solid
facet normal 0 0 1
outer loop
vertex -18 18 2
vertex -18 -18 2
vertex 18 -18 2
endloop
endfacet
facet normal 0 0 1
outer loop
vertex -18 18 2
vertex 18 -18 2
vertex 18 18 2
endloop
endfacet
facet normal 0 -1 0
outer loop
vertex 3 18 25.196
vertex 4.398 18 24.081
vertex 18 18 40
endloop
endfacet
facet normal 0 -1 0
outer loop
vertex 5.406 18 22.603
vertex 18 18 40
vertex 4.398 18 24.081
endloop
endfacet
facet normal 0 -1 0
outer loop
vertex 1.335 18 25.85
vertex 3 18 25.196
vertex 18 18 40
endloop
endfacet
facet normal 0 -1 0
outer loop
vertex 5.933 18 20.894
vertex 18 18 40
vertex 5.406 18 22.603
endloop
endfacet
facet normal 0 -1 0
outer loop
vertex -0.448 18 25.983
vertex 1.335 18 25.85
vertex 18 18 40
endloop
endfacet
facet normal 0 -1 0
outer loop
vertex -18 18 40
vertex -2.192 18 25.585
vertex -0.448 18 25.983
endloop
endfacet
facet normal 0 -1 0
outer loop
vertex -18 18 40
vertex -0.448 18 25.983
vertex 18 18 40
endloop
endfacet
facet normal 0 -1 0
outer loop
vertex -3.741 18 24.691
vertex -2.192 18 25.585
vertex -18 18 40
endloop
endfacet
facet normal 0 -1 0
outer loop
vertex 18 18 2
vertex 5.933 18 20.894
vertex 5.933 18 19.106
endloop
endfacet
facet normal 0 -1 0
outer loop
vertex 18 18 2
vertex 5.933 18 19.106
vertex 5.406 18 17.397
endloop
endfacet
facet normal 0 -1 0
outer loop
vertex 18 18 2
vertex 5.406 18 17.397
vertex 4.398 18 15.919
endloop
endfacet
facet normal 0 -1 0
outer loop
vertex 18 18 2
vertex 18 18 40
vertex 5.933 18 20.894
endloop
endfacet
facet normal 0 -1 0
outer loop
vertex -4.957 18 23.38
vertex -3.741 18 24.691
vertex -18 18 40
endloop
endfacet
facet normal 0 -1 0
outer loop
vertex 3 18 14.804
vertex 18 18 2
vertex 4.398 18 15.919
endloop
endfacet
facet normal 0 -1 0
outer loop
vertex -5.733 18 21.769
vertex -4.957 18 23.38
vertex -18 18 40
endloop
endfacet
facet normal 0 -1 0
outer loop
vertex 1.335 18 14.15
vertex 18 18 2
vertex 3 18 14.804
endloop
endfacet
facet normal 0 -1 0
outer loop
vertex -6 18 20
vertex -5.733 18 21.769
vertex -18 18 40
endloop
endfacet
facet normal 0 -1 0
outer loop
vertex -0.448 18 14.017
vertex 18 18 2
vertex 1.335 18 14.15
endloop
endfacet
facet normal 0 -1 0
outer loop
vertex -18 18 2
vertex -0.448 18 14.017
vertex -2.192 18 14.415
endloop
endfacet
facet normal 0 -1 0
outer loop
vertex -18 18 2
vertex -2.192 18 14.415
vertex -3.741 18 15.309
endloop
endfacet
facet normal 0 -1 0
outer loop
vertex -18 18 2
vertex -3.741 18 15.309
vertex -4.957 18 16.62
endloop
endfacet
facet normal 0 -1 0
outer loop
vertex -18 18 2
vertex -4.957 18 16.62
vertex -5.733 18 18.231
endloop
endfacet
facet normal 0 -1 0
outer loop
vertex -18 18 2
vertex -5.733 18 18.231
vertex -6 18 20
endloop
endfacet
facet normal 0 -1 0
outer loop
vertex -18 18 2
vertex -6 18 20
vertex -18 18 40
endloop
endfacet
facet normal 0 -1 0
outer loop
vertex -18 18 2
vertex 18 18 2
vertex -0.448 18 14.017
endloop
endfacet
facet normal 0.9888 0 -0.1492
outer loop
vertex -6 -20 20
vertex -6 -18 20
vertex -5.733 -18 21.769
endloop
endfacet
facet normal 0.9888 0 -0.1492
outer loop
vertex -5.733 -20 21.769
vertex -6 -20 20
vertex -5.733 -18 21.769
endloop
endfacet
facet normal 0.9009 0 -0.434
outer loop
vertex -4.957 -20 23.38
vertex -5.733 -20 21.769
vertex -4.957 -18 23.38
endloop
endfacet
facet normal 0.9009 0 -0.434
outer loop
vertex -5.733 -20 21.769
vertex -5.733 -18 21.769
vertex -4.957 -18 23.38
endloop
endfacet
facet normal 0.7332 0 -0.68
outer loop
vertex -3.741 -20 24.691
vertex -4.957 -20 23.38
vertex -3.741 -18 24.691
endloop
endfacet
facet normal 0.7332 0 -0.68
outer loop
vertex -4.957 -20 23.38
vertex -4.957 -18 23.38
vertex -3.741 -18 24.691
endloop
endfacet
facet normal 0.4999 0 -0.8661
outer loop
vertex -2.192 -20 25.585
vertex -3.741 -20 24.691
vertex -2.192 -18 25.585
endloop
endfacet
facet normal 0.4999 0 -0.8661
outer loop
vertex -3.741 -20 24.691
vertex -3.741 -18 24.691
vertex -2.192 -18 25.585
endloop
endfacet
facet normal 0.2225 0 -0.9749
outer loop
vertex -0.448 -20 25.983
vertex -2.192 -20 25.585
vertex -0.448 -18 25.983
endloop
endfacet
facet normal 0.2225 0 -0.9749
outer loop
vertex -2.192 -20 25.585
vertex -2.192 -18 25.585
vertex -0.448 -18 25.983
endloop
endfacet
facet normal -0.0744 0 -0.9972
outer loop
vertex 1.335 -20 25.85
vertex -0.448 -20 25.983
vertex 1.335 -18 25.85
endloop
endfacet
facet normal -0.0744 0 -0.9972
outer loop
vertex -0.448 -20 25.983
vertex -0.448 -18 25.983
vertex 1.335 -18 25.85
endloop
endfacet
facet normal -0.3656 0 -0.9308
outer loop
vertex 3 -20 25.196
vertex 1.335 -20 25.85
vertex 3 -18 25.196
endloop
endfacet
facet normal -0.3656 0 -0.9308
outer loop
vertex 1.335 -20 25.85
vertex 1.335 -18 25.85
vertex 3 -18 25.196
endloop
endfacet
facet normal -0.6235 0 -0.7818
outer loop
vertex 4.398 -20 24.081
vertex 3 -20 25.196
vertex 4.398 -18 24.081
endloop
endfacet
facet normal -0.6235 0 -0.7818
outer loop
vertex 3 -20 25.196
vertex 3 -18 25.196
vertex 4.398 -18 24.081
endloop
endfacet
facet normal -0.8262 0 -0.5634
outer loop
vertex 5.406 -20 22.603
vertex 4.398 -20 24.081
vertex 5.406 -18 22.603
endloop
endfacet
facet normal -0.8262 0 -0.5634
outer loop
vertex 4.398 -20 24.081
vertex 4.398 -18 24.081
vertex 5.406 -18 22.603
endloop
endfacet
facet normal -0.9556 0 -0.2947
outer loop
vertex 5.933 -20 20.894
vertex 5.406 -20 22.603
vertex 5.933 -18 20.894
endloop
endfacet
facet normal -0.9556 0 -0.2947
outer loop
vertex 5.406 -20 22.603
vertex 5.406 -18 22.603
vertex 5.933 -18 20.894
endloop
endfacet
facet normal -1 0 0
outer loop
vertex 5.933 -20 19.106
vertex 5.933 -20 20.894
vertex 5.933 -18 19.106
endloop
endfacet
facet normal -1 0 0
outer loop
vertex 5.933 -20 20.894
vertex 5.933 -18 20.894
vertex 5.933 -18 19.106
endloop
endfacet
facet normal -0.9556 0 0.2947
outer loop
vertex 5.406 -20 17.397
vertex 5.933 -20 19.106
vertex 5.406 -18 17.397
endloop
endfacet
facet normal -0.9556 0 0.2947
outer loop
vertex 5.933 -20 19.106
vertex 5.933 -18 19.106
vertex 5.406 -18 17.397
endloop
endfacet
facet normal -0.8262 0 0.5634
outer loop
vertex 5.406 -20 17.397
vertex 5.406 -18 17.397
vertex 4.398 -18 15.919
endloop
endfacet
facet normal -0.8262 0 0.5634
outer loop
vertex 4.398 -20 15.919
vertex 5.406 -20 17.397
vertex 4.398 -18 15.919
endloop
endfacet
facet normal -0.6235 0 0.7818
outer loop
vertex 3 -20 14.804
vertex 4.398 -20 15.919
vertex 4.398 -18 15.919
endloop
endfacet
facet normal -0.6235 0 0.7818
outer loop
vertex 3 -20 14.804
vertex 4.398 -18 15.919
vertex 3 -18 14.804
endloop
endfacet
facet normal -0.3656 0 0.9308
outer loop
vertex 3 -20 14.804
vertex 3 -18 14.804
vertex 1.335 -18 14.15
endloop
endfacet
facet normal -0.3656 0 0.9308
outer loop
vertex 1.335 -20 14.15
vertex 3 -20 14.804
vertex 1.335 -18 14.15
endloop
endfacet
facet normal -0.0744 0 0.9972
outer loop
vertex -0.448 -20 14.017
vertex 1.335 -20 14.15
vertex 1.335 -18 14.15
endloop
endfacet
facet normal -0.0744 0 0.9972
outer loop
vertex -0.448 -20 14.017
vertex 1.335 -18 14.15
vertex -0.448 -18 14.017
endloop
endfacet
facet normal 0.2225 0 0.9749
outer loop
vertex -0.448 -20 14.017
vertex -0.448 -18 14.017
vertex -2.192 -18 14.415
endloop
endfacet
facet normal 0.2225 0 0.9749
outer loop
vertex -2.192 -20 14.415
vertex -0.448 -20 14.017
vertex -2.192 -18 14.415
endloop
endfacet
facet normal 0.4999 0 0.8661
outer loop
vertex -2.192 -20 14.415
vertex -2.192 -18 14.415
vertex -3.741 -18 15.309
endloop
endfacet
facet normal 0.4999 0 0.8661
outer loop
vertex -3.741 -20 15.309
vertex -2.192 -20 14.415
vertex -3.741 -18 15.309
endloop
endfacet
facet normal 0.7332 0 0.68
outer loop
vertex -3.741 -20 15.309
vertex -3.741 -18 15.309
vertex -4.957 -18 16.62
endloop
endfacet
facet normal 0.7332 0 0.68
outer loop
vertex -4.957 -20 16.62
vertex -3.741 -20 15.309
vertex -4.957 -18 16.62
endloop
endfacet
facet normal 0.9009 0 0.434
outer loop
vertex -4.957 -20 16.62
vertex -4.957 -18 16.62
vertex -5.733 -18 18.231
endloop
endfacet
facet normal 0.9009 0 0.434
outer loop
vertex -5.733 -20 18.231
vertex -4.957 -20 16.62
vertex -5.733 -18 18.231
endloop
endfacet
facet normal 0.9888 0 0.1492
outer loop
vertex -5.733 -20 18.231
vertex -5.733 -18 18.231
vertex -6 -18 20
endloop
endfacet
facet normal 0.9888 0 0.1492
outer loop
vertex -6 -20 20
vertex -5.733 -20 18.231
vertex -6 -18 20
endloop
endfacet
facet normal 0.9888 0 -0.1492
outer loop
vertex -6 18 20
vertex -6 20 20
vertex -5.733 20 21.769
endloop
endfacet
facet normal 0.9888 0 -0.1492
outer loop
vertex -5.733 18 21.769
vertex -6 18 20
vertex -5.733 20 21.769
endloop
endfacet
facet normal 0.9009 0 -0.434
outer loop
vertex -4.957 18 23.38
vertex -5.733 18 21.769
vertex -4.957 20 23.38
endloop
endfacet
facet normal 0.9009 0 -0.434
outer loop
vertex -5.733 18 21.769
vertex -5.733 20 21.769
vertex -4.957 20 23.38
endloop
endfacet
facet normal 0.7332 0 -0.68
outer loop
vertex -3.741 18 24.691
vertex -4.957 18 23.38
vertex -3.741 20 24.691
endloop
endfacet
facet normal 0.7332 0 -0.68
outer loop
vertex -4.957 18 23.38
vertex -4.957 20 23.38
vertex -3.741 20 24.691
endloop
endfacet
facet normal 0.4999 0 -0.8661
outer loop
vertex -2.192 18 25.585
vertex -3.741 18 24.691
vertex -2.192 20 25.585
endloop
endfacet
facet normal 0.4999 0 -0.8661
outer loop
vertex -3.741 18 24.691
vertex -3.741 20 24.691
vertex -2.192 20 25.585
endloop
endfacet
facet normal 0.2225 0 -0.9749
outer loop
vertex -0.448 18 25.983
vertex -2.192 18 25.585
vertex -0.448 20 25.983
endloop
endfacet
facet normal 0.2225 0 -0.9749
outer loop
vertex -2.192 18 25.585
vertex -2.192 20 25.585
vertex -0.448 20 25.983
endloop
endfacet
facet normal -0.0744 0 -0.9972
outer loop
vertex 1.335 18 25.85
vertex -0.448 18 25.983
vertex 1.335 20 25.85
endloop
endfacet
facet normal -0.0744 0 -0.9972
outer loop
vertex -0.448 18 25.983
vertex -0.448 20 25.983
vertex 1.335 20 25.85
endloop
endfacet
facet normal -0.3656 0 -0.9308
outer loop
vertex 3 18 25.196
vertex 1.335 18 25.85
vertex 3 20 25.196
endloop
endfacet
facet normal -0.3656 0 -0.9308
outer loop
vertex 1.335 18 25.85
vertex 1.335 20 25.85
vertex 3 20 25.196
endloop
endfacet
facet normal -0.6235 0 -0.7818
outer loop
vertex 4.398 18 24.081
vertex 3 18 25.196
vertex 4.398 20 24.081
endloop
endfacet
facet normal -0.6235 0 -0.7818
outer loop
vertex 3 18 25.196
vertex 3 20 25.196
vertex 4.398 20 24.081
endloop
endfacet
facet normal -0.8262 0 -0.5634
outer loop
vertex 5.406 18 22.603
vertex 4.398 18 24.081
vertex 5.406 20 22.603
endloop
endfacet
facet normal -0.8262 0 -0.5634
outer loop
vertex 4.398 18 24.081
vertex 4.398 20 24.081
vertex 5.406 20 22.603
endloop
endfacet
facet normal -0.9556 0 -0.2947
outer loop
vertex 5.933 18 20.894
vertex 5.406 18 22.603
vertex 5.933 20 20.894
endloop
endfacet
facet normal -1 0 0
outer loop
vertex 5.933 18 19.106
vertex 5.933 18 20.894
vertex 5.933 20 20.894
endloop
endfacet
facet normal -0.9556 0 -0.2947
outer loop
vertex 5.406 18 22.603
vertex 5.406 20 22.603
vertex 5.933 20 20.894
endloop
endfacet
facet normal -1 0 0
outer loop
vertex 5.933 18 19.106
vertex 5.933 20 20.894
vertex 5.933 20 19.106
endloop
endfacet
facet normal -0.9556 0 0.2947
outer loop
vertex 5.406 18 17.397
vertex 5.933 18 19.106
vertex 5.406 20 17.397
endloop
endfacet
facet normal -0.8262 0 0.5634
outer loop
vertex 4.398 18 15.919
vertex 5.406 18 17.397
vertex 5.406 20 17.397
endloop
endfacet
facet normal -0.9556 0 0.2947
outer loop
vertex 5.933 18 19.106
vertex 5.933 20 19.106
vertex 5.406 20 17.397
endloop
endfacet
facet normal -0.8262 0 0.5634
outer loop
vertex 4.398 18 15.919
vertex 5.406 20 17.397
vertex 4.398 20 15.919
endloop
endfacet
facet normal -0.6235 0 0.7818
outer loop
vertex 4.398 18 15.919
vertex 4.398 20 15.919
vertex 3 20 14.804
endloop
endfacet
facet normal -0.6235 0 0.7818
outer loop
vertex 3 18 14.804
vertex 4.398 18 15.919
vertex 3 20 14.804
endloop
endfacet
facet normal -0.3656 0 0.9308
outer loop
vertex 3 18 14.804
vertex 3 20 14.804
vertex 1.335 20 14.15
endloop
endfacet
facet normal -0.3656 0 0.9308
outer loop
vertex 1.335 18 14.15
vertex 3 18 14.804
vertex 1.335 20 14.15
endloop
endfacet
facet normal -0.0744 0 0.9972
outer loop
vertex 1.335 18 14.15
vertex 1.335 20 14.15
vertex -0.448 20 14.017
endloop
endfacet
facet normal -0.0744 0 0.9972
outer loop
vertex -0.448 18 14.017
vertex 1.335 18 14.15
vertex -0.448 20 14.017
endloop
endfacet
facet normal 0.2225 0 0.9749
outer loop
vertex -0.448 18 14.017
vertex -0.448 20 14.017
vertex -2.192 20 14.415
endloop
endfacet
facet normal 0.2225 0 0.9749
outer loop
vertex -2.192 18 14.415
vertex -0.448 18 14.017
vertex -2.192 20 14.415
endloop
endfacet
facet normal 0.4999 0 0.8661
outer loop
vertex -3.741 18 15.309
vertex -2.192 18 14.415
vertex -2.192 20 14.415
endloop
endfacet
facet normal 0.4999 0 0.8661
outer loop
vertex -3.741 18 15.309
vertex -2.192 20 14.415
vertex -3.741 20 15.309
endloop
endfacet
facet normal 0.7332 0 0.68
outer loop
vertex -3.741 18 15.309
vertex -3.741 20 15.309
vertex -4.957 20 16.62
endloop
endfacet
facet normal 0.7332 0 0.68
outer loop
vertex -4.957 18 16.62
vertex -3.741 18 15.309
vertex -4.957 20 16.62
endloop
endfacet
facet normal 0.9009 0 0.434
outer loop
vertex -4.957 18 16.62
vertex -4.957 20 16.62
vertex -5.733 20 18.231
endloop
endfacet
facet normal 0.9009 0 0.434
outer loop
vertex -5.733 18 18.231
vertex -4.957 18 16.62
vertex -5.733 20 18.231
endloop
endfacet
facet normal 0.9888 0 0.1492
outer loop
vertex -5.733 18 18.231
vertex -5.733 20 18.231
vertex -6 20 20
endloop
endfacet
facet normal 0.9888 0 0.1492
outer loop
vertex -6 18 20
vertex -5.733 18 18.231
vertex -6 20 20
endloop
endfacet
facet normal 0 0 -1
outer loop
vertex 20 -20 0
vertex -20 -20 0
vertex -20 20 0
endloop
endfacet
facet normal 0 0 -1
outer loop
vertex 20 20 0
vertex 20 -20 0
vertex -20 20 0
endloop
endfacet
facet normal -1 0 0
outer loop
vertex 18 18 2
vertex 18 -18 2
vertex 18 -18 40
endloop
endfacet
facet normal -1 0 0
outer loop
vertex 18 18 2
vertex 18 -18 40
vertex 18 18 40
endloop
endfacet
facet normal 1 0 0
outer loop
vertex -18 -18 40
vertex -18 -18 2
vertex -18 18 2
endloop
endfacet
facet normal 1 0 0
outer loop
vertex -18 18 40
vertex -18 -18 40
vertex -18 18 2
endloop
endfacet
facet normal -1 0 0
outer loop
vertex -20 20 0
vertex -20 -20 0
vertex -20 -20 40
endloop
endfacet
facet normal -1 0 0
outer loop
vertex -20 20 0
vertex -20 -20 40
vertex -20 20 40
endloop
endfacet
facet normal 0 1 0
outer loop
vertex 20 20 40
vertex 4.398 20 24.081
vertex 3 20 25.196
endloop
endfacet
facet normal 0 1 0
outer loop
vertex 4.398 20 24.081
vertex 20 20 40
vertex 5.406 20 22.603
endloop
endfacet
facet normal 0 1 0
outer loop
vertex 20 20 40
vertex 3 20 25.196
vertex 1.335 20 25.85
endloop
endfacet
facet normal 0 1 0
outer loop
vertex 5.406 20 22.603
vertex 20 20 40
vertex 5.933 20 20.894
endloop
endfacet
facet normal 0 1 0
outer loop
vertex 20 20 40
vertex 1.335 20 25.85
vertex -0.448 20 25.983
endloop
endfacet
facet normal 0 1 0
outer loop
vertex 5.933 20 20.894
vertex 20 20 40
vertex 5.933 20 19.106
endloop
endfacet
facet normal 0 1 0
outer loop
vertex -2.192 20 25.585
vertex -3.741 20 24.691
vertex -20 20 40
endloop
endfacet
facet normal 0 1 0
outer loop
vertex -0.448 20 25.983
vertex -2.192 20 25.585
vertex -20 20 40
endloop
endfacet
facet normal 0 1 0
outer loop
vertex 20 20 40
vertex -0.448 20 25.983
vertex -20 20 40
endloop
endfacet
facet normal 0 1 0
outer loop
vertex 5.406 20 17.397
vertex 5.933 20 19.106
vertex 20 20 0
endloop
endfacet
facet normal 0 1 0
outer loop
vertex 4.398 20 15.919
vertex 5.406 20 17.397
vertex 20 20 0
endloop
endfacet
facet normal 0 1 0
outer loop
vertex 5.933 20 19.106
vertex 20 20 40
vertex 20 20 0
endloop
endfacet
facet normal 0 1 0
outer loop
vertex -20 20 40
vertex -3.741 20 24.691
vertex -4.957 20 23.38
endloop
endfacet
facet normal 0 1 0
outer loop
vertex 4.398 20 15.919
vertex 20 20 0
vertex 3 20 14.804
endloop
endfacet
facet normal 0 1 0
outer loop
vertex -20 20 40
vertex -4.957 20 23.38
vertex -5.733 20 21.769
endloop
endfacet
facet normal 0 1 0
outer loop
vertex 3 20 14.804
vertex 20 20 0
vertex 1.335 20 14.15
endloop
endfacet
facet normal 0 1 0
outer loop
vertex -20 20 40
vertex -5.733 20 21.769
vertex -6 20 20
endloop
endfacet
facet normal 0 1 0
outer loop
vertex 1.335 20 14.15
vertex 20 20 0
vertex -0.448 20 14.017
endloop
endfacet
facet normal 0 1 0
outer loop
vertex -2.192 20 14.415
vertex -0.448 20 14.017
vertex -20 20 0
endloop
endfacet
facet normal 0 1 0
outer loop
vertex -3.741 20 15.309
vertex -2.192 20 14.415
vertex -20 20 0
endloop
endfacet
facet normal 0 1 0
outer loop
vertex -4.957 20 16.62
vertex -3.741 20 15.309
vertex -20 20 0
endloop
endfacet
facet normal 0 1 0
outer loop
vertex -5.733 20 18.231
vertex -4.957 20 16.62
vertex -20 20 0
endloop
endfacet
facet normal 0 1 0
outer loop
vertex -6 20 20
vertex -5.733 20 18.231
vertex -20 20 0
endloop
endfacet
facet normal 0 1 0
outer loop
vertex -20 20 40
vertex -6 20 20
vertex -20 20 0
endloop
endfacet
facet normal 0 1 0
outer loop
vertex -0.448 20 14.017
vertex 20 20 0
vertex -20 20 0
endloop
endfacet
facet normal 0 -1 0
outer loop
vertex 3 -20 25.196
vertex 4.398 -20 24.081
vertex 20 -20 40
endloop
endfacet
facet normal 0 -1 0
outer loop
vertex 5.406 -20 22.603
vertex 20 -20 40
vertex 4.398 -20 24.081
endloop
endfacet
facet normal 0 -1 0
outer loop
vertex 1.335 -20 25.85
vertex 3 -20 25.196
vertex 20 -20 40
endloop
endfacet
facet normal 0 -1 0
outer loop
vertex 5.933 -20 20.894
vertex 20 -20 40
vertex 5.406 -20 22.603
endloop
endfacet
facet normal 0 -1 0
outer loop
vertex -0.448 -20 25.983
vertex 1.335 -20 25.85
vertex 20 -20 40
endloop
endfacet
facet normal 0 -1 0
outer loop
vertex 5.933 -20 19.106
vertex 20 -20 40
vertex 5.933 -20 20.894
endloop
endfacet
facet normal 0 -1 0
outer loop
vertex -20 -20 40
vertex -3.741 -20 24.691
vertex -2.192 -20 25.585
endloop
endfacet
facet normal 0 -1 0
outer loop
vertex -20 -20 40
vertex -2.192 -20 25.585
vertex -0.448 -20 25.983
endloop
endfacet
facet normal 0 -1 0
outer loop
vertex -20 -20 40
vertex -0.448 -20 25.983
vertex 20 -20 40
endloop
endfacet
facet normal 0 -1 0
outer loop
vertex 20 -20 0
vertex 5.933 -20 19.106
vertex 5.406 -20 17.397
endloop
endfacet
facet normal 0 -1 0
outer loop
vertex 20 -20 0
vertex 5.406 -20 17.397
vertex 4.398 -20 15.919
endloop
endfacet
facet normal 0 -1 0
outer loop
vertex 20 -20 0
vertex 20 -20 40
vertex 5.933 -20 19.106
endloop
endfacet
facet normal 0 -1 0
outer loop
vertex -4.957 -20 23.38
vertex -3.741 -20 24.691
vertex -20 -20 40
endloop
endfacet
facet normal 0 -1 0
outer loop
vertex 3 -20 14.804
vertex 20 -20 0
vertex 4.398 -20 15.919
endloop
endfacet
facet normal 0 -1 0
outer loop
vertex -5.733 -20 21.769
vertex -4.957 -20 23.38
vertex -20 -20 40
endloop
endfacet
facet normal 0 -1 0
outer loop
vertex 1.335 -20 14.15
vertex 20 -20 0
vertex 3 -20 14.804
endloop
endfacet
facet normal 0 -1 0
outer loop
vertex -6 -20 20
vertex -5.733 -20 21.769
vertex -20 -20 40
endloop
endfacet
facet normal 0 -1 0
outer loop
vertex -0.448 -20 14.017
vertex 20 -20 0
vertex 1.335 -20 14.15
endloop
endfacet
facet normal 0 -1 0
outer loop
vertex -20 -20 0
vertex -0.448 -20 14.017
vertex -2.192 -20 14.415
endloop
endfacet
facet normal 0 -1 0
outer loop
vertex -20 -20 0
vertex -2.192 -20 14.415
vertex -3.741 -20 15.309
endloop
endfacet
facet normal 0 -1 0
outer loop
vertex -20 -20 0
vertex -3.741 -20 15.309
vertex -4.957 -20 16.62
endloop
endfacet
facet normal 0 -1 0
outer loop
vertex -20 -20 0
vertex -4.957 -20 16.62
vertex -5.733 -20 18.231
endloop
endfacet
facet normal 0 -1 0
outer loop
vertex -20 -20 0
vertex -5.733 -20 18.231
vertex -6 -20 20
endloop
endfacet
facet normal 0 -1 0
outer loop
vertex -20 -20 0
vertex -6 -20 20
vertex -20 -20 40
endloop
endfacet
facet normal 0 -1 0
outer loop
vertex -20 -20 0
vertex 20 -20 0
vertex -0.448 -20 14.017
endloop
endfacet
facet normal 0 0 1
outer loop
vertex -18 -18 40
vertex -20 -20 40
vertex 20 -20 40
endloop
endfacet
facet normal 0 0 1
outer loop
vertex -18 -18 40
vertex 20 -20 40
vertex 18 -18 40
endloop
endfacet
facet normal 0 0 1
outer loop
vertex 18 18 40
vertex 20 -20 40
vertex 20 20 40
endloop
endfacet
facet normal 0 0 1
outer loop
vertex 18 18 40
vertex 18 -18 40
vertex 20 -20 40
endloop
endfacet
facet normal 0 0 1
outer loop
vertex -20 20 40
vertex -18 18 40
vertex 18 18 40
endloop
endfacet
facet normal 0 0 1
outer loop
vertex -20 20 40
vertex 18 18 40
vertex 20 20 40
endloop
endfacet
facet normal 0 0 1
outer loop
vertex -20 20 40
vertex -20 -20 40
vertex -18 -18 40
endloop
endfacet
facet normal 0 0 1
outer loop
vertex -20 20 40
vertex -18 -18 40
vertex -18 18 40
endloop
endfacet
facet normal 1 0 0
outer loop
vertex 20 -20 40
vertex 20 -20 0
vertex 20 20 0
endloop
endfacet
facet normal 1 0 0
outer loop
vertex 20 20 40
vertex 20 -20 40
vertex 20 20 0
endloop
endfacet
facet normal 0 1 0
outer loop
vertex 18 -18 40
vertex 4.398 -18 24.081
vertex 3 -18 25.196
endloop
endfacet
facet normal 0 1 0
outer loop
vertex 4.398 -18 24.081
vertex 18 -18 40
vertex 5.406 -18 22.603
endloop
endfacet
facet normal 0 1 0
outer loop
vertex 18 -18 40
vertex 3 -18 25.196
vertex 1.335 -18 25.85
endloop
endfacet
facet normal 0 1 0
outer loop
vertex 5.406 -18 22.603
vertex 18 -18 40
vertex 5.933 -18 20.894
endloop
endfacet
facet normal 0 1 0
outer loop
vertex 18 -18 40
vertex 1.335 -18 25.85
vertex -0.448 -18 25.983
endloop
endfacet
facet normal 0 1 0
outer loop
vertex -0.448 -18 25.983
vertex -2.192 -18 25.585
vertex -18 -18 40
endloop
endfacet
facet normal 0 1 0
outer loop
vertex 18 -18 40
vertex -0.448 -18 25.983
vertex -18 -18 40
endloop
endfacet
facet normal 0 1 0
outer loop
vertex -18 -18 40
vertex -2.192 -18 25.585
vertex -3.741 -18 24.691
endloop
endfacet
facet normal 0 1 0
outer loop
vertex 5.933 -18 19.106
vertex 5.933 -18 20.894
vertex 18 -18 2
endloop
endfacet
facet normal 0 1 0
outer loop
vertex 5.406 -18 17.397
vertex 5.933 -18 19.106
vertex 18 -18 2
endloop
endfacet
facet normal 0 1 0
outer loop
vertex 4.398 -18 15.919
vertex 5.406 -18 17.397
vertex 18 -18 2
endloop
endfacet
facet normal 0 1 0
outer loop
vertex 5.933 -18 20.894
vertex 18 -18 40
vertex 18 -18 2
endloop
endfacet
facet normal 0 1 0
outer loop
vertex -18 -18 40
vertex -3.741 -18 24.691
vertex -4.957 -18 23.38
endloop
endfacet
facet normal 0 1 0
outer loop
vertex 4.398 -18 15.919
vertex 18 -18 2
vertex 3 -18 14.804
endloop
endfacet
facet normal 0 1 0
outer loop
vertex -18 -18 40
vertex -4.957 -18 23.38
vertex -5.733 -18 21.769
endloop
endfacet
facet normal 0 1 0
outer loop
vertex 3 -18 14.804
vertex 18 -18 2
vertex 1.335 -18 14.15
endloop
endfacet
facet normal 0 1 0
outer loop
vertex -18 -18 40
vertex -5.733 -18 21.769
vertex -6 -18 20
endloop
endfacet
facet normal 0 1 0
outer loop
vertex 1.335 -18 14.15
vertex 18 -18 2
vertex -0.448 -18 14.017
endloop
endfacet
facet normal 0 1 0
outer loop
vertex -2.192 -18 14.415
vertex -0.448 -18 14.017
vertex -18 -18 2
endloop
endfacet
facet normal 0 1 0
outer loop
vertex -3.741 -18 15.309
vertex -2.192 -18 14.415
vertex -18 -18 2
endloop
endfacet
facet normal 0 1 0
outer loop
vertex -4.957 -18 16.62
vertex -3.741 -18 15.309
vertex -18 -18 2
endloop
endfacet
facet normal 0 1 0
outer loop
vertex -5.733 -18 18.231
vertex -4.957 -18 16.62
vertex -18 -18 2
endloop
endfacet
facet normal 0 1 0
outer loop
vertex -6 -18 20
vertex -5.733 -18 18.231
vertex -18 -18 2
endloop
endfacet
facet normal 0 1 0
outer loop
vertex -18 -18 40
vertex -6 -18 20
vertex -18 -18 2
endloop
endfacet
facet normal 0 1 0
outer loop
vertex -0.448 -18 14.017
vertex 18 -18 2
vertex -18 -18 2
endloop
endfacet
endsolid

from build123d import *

# Parameters (mm, degrees)
SKETCH1_W           = 40
SKETCH1_H           = 40
BOSS_EXTRUDE1_DEPTH = 40
SHELL1_T            = -2
SKETCH2_R           = 6
CUT_EXTRUDE1_DEPTH  = 40


with BuildPart() as part:
    # Sketch1 → Boss-Extrude1 (new body)
    with BuildSketch(Plane(origin=(0, 0, 0), x_dir=(0, 1, 0), z_dir=(0, 0, 1))):
        Rectangle(SKETCH1_W, SKETCH1_H)
    extrude(amount=BOSS_EXTRUDE1_DEPTH)

    # Shell1
    shell1_openings = [part.faces().sort_by_distance(p)[0] for p in [
        (0, 0, 40),
    ]]
    offset(amount=SHELL1_T, openings=shell1_openings, kind=Kind.INTERSECTION)

    # Sketch2 → Cut-Extrude1 (cut)
    with BuildSketch(Plane(origin=(0, 20, 0), x_dir=(-1, 0, 0), z_dir=(0, 1, 0))):
        with Locations((0, 20)):
            Circle(SKETCH2_R)
    extrude(amount=-CUT_EXTRUDE1_DEPTH, mode=Mode.SUBTRACT)


solid = part.part
